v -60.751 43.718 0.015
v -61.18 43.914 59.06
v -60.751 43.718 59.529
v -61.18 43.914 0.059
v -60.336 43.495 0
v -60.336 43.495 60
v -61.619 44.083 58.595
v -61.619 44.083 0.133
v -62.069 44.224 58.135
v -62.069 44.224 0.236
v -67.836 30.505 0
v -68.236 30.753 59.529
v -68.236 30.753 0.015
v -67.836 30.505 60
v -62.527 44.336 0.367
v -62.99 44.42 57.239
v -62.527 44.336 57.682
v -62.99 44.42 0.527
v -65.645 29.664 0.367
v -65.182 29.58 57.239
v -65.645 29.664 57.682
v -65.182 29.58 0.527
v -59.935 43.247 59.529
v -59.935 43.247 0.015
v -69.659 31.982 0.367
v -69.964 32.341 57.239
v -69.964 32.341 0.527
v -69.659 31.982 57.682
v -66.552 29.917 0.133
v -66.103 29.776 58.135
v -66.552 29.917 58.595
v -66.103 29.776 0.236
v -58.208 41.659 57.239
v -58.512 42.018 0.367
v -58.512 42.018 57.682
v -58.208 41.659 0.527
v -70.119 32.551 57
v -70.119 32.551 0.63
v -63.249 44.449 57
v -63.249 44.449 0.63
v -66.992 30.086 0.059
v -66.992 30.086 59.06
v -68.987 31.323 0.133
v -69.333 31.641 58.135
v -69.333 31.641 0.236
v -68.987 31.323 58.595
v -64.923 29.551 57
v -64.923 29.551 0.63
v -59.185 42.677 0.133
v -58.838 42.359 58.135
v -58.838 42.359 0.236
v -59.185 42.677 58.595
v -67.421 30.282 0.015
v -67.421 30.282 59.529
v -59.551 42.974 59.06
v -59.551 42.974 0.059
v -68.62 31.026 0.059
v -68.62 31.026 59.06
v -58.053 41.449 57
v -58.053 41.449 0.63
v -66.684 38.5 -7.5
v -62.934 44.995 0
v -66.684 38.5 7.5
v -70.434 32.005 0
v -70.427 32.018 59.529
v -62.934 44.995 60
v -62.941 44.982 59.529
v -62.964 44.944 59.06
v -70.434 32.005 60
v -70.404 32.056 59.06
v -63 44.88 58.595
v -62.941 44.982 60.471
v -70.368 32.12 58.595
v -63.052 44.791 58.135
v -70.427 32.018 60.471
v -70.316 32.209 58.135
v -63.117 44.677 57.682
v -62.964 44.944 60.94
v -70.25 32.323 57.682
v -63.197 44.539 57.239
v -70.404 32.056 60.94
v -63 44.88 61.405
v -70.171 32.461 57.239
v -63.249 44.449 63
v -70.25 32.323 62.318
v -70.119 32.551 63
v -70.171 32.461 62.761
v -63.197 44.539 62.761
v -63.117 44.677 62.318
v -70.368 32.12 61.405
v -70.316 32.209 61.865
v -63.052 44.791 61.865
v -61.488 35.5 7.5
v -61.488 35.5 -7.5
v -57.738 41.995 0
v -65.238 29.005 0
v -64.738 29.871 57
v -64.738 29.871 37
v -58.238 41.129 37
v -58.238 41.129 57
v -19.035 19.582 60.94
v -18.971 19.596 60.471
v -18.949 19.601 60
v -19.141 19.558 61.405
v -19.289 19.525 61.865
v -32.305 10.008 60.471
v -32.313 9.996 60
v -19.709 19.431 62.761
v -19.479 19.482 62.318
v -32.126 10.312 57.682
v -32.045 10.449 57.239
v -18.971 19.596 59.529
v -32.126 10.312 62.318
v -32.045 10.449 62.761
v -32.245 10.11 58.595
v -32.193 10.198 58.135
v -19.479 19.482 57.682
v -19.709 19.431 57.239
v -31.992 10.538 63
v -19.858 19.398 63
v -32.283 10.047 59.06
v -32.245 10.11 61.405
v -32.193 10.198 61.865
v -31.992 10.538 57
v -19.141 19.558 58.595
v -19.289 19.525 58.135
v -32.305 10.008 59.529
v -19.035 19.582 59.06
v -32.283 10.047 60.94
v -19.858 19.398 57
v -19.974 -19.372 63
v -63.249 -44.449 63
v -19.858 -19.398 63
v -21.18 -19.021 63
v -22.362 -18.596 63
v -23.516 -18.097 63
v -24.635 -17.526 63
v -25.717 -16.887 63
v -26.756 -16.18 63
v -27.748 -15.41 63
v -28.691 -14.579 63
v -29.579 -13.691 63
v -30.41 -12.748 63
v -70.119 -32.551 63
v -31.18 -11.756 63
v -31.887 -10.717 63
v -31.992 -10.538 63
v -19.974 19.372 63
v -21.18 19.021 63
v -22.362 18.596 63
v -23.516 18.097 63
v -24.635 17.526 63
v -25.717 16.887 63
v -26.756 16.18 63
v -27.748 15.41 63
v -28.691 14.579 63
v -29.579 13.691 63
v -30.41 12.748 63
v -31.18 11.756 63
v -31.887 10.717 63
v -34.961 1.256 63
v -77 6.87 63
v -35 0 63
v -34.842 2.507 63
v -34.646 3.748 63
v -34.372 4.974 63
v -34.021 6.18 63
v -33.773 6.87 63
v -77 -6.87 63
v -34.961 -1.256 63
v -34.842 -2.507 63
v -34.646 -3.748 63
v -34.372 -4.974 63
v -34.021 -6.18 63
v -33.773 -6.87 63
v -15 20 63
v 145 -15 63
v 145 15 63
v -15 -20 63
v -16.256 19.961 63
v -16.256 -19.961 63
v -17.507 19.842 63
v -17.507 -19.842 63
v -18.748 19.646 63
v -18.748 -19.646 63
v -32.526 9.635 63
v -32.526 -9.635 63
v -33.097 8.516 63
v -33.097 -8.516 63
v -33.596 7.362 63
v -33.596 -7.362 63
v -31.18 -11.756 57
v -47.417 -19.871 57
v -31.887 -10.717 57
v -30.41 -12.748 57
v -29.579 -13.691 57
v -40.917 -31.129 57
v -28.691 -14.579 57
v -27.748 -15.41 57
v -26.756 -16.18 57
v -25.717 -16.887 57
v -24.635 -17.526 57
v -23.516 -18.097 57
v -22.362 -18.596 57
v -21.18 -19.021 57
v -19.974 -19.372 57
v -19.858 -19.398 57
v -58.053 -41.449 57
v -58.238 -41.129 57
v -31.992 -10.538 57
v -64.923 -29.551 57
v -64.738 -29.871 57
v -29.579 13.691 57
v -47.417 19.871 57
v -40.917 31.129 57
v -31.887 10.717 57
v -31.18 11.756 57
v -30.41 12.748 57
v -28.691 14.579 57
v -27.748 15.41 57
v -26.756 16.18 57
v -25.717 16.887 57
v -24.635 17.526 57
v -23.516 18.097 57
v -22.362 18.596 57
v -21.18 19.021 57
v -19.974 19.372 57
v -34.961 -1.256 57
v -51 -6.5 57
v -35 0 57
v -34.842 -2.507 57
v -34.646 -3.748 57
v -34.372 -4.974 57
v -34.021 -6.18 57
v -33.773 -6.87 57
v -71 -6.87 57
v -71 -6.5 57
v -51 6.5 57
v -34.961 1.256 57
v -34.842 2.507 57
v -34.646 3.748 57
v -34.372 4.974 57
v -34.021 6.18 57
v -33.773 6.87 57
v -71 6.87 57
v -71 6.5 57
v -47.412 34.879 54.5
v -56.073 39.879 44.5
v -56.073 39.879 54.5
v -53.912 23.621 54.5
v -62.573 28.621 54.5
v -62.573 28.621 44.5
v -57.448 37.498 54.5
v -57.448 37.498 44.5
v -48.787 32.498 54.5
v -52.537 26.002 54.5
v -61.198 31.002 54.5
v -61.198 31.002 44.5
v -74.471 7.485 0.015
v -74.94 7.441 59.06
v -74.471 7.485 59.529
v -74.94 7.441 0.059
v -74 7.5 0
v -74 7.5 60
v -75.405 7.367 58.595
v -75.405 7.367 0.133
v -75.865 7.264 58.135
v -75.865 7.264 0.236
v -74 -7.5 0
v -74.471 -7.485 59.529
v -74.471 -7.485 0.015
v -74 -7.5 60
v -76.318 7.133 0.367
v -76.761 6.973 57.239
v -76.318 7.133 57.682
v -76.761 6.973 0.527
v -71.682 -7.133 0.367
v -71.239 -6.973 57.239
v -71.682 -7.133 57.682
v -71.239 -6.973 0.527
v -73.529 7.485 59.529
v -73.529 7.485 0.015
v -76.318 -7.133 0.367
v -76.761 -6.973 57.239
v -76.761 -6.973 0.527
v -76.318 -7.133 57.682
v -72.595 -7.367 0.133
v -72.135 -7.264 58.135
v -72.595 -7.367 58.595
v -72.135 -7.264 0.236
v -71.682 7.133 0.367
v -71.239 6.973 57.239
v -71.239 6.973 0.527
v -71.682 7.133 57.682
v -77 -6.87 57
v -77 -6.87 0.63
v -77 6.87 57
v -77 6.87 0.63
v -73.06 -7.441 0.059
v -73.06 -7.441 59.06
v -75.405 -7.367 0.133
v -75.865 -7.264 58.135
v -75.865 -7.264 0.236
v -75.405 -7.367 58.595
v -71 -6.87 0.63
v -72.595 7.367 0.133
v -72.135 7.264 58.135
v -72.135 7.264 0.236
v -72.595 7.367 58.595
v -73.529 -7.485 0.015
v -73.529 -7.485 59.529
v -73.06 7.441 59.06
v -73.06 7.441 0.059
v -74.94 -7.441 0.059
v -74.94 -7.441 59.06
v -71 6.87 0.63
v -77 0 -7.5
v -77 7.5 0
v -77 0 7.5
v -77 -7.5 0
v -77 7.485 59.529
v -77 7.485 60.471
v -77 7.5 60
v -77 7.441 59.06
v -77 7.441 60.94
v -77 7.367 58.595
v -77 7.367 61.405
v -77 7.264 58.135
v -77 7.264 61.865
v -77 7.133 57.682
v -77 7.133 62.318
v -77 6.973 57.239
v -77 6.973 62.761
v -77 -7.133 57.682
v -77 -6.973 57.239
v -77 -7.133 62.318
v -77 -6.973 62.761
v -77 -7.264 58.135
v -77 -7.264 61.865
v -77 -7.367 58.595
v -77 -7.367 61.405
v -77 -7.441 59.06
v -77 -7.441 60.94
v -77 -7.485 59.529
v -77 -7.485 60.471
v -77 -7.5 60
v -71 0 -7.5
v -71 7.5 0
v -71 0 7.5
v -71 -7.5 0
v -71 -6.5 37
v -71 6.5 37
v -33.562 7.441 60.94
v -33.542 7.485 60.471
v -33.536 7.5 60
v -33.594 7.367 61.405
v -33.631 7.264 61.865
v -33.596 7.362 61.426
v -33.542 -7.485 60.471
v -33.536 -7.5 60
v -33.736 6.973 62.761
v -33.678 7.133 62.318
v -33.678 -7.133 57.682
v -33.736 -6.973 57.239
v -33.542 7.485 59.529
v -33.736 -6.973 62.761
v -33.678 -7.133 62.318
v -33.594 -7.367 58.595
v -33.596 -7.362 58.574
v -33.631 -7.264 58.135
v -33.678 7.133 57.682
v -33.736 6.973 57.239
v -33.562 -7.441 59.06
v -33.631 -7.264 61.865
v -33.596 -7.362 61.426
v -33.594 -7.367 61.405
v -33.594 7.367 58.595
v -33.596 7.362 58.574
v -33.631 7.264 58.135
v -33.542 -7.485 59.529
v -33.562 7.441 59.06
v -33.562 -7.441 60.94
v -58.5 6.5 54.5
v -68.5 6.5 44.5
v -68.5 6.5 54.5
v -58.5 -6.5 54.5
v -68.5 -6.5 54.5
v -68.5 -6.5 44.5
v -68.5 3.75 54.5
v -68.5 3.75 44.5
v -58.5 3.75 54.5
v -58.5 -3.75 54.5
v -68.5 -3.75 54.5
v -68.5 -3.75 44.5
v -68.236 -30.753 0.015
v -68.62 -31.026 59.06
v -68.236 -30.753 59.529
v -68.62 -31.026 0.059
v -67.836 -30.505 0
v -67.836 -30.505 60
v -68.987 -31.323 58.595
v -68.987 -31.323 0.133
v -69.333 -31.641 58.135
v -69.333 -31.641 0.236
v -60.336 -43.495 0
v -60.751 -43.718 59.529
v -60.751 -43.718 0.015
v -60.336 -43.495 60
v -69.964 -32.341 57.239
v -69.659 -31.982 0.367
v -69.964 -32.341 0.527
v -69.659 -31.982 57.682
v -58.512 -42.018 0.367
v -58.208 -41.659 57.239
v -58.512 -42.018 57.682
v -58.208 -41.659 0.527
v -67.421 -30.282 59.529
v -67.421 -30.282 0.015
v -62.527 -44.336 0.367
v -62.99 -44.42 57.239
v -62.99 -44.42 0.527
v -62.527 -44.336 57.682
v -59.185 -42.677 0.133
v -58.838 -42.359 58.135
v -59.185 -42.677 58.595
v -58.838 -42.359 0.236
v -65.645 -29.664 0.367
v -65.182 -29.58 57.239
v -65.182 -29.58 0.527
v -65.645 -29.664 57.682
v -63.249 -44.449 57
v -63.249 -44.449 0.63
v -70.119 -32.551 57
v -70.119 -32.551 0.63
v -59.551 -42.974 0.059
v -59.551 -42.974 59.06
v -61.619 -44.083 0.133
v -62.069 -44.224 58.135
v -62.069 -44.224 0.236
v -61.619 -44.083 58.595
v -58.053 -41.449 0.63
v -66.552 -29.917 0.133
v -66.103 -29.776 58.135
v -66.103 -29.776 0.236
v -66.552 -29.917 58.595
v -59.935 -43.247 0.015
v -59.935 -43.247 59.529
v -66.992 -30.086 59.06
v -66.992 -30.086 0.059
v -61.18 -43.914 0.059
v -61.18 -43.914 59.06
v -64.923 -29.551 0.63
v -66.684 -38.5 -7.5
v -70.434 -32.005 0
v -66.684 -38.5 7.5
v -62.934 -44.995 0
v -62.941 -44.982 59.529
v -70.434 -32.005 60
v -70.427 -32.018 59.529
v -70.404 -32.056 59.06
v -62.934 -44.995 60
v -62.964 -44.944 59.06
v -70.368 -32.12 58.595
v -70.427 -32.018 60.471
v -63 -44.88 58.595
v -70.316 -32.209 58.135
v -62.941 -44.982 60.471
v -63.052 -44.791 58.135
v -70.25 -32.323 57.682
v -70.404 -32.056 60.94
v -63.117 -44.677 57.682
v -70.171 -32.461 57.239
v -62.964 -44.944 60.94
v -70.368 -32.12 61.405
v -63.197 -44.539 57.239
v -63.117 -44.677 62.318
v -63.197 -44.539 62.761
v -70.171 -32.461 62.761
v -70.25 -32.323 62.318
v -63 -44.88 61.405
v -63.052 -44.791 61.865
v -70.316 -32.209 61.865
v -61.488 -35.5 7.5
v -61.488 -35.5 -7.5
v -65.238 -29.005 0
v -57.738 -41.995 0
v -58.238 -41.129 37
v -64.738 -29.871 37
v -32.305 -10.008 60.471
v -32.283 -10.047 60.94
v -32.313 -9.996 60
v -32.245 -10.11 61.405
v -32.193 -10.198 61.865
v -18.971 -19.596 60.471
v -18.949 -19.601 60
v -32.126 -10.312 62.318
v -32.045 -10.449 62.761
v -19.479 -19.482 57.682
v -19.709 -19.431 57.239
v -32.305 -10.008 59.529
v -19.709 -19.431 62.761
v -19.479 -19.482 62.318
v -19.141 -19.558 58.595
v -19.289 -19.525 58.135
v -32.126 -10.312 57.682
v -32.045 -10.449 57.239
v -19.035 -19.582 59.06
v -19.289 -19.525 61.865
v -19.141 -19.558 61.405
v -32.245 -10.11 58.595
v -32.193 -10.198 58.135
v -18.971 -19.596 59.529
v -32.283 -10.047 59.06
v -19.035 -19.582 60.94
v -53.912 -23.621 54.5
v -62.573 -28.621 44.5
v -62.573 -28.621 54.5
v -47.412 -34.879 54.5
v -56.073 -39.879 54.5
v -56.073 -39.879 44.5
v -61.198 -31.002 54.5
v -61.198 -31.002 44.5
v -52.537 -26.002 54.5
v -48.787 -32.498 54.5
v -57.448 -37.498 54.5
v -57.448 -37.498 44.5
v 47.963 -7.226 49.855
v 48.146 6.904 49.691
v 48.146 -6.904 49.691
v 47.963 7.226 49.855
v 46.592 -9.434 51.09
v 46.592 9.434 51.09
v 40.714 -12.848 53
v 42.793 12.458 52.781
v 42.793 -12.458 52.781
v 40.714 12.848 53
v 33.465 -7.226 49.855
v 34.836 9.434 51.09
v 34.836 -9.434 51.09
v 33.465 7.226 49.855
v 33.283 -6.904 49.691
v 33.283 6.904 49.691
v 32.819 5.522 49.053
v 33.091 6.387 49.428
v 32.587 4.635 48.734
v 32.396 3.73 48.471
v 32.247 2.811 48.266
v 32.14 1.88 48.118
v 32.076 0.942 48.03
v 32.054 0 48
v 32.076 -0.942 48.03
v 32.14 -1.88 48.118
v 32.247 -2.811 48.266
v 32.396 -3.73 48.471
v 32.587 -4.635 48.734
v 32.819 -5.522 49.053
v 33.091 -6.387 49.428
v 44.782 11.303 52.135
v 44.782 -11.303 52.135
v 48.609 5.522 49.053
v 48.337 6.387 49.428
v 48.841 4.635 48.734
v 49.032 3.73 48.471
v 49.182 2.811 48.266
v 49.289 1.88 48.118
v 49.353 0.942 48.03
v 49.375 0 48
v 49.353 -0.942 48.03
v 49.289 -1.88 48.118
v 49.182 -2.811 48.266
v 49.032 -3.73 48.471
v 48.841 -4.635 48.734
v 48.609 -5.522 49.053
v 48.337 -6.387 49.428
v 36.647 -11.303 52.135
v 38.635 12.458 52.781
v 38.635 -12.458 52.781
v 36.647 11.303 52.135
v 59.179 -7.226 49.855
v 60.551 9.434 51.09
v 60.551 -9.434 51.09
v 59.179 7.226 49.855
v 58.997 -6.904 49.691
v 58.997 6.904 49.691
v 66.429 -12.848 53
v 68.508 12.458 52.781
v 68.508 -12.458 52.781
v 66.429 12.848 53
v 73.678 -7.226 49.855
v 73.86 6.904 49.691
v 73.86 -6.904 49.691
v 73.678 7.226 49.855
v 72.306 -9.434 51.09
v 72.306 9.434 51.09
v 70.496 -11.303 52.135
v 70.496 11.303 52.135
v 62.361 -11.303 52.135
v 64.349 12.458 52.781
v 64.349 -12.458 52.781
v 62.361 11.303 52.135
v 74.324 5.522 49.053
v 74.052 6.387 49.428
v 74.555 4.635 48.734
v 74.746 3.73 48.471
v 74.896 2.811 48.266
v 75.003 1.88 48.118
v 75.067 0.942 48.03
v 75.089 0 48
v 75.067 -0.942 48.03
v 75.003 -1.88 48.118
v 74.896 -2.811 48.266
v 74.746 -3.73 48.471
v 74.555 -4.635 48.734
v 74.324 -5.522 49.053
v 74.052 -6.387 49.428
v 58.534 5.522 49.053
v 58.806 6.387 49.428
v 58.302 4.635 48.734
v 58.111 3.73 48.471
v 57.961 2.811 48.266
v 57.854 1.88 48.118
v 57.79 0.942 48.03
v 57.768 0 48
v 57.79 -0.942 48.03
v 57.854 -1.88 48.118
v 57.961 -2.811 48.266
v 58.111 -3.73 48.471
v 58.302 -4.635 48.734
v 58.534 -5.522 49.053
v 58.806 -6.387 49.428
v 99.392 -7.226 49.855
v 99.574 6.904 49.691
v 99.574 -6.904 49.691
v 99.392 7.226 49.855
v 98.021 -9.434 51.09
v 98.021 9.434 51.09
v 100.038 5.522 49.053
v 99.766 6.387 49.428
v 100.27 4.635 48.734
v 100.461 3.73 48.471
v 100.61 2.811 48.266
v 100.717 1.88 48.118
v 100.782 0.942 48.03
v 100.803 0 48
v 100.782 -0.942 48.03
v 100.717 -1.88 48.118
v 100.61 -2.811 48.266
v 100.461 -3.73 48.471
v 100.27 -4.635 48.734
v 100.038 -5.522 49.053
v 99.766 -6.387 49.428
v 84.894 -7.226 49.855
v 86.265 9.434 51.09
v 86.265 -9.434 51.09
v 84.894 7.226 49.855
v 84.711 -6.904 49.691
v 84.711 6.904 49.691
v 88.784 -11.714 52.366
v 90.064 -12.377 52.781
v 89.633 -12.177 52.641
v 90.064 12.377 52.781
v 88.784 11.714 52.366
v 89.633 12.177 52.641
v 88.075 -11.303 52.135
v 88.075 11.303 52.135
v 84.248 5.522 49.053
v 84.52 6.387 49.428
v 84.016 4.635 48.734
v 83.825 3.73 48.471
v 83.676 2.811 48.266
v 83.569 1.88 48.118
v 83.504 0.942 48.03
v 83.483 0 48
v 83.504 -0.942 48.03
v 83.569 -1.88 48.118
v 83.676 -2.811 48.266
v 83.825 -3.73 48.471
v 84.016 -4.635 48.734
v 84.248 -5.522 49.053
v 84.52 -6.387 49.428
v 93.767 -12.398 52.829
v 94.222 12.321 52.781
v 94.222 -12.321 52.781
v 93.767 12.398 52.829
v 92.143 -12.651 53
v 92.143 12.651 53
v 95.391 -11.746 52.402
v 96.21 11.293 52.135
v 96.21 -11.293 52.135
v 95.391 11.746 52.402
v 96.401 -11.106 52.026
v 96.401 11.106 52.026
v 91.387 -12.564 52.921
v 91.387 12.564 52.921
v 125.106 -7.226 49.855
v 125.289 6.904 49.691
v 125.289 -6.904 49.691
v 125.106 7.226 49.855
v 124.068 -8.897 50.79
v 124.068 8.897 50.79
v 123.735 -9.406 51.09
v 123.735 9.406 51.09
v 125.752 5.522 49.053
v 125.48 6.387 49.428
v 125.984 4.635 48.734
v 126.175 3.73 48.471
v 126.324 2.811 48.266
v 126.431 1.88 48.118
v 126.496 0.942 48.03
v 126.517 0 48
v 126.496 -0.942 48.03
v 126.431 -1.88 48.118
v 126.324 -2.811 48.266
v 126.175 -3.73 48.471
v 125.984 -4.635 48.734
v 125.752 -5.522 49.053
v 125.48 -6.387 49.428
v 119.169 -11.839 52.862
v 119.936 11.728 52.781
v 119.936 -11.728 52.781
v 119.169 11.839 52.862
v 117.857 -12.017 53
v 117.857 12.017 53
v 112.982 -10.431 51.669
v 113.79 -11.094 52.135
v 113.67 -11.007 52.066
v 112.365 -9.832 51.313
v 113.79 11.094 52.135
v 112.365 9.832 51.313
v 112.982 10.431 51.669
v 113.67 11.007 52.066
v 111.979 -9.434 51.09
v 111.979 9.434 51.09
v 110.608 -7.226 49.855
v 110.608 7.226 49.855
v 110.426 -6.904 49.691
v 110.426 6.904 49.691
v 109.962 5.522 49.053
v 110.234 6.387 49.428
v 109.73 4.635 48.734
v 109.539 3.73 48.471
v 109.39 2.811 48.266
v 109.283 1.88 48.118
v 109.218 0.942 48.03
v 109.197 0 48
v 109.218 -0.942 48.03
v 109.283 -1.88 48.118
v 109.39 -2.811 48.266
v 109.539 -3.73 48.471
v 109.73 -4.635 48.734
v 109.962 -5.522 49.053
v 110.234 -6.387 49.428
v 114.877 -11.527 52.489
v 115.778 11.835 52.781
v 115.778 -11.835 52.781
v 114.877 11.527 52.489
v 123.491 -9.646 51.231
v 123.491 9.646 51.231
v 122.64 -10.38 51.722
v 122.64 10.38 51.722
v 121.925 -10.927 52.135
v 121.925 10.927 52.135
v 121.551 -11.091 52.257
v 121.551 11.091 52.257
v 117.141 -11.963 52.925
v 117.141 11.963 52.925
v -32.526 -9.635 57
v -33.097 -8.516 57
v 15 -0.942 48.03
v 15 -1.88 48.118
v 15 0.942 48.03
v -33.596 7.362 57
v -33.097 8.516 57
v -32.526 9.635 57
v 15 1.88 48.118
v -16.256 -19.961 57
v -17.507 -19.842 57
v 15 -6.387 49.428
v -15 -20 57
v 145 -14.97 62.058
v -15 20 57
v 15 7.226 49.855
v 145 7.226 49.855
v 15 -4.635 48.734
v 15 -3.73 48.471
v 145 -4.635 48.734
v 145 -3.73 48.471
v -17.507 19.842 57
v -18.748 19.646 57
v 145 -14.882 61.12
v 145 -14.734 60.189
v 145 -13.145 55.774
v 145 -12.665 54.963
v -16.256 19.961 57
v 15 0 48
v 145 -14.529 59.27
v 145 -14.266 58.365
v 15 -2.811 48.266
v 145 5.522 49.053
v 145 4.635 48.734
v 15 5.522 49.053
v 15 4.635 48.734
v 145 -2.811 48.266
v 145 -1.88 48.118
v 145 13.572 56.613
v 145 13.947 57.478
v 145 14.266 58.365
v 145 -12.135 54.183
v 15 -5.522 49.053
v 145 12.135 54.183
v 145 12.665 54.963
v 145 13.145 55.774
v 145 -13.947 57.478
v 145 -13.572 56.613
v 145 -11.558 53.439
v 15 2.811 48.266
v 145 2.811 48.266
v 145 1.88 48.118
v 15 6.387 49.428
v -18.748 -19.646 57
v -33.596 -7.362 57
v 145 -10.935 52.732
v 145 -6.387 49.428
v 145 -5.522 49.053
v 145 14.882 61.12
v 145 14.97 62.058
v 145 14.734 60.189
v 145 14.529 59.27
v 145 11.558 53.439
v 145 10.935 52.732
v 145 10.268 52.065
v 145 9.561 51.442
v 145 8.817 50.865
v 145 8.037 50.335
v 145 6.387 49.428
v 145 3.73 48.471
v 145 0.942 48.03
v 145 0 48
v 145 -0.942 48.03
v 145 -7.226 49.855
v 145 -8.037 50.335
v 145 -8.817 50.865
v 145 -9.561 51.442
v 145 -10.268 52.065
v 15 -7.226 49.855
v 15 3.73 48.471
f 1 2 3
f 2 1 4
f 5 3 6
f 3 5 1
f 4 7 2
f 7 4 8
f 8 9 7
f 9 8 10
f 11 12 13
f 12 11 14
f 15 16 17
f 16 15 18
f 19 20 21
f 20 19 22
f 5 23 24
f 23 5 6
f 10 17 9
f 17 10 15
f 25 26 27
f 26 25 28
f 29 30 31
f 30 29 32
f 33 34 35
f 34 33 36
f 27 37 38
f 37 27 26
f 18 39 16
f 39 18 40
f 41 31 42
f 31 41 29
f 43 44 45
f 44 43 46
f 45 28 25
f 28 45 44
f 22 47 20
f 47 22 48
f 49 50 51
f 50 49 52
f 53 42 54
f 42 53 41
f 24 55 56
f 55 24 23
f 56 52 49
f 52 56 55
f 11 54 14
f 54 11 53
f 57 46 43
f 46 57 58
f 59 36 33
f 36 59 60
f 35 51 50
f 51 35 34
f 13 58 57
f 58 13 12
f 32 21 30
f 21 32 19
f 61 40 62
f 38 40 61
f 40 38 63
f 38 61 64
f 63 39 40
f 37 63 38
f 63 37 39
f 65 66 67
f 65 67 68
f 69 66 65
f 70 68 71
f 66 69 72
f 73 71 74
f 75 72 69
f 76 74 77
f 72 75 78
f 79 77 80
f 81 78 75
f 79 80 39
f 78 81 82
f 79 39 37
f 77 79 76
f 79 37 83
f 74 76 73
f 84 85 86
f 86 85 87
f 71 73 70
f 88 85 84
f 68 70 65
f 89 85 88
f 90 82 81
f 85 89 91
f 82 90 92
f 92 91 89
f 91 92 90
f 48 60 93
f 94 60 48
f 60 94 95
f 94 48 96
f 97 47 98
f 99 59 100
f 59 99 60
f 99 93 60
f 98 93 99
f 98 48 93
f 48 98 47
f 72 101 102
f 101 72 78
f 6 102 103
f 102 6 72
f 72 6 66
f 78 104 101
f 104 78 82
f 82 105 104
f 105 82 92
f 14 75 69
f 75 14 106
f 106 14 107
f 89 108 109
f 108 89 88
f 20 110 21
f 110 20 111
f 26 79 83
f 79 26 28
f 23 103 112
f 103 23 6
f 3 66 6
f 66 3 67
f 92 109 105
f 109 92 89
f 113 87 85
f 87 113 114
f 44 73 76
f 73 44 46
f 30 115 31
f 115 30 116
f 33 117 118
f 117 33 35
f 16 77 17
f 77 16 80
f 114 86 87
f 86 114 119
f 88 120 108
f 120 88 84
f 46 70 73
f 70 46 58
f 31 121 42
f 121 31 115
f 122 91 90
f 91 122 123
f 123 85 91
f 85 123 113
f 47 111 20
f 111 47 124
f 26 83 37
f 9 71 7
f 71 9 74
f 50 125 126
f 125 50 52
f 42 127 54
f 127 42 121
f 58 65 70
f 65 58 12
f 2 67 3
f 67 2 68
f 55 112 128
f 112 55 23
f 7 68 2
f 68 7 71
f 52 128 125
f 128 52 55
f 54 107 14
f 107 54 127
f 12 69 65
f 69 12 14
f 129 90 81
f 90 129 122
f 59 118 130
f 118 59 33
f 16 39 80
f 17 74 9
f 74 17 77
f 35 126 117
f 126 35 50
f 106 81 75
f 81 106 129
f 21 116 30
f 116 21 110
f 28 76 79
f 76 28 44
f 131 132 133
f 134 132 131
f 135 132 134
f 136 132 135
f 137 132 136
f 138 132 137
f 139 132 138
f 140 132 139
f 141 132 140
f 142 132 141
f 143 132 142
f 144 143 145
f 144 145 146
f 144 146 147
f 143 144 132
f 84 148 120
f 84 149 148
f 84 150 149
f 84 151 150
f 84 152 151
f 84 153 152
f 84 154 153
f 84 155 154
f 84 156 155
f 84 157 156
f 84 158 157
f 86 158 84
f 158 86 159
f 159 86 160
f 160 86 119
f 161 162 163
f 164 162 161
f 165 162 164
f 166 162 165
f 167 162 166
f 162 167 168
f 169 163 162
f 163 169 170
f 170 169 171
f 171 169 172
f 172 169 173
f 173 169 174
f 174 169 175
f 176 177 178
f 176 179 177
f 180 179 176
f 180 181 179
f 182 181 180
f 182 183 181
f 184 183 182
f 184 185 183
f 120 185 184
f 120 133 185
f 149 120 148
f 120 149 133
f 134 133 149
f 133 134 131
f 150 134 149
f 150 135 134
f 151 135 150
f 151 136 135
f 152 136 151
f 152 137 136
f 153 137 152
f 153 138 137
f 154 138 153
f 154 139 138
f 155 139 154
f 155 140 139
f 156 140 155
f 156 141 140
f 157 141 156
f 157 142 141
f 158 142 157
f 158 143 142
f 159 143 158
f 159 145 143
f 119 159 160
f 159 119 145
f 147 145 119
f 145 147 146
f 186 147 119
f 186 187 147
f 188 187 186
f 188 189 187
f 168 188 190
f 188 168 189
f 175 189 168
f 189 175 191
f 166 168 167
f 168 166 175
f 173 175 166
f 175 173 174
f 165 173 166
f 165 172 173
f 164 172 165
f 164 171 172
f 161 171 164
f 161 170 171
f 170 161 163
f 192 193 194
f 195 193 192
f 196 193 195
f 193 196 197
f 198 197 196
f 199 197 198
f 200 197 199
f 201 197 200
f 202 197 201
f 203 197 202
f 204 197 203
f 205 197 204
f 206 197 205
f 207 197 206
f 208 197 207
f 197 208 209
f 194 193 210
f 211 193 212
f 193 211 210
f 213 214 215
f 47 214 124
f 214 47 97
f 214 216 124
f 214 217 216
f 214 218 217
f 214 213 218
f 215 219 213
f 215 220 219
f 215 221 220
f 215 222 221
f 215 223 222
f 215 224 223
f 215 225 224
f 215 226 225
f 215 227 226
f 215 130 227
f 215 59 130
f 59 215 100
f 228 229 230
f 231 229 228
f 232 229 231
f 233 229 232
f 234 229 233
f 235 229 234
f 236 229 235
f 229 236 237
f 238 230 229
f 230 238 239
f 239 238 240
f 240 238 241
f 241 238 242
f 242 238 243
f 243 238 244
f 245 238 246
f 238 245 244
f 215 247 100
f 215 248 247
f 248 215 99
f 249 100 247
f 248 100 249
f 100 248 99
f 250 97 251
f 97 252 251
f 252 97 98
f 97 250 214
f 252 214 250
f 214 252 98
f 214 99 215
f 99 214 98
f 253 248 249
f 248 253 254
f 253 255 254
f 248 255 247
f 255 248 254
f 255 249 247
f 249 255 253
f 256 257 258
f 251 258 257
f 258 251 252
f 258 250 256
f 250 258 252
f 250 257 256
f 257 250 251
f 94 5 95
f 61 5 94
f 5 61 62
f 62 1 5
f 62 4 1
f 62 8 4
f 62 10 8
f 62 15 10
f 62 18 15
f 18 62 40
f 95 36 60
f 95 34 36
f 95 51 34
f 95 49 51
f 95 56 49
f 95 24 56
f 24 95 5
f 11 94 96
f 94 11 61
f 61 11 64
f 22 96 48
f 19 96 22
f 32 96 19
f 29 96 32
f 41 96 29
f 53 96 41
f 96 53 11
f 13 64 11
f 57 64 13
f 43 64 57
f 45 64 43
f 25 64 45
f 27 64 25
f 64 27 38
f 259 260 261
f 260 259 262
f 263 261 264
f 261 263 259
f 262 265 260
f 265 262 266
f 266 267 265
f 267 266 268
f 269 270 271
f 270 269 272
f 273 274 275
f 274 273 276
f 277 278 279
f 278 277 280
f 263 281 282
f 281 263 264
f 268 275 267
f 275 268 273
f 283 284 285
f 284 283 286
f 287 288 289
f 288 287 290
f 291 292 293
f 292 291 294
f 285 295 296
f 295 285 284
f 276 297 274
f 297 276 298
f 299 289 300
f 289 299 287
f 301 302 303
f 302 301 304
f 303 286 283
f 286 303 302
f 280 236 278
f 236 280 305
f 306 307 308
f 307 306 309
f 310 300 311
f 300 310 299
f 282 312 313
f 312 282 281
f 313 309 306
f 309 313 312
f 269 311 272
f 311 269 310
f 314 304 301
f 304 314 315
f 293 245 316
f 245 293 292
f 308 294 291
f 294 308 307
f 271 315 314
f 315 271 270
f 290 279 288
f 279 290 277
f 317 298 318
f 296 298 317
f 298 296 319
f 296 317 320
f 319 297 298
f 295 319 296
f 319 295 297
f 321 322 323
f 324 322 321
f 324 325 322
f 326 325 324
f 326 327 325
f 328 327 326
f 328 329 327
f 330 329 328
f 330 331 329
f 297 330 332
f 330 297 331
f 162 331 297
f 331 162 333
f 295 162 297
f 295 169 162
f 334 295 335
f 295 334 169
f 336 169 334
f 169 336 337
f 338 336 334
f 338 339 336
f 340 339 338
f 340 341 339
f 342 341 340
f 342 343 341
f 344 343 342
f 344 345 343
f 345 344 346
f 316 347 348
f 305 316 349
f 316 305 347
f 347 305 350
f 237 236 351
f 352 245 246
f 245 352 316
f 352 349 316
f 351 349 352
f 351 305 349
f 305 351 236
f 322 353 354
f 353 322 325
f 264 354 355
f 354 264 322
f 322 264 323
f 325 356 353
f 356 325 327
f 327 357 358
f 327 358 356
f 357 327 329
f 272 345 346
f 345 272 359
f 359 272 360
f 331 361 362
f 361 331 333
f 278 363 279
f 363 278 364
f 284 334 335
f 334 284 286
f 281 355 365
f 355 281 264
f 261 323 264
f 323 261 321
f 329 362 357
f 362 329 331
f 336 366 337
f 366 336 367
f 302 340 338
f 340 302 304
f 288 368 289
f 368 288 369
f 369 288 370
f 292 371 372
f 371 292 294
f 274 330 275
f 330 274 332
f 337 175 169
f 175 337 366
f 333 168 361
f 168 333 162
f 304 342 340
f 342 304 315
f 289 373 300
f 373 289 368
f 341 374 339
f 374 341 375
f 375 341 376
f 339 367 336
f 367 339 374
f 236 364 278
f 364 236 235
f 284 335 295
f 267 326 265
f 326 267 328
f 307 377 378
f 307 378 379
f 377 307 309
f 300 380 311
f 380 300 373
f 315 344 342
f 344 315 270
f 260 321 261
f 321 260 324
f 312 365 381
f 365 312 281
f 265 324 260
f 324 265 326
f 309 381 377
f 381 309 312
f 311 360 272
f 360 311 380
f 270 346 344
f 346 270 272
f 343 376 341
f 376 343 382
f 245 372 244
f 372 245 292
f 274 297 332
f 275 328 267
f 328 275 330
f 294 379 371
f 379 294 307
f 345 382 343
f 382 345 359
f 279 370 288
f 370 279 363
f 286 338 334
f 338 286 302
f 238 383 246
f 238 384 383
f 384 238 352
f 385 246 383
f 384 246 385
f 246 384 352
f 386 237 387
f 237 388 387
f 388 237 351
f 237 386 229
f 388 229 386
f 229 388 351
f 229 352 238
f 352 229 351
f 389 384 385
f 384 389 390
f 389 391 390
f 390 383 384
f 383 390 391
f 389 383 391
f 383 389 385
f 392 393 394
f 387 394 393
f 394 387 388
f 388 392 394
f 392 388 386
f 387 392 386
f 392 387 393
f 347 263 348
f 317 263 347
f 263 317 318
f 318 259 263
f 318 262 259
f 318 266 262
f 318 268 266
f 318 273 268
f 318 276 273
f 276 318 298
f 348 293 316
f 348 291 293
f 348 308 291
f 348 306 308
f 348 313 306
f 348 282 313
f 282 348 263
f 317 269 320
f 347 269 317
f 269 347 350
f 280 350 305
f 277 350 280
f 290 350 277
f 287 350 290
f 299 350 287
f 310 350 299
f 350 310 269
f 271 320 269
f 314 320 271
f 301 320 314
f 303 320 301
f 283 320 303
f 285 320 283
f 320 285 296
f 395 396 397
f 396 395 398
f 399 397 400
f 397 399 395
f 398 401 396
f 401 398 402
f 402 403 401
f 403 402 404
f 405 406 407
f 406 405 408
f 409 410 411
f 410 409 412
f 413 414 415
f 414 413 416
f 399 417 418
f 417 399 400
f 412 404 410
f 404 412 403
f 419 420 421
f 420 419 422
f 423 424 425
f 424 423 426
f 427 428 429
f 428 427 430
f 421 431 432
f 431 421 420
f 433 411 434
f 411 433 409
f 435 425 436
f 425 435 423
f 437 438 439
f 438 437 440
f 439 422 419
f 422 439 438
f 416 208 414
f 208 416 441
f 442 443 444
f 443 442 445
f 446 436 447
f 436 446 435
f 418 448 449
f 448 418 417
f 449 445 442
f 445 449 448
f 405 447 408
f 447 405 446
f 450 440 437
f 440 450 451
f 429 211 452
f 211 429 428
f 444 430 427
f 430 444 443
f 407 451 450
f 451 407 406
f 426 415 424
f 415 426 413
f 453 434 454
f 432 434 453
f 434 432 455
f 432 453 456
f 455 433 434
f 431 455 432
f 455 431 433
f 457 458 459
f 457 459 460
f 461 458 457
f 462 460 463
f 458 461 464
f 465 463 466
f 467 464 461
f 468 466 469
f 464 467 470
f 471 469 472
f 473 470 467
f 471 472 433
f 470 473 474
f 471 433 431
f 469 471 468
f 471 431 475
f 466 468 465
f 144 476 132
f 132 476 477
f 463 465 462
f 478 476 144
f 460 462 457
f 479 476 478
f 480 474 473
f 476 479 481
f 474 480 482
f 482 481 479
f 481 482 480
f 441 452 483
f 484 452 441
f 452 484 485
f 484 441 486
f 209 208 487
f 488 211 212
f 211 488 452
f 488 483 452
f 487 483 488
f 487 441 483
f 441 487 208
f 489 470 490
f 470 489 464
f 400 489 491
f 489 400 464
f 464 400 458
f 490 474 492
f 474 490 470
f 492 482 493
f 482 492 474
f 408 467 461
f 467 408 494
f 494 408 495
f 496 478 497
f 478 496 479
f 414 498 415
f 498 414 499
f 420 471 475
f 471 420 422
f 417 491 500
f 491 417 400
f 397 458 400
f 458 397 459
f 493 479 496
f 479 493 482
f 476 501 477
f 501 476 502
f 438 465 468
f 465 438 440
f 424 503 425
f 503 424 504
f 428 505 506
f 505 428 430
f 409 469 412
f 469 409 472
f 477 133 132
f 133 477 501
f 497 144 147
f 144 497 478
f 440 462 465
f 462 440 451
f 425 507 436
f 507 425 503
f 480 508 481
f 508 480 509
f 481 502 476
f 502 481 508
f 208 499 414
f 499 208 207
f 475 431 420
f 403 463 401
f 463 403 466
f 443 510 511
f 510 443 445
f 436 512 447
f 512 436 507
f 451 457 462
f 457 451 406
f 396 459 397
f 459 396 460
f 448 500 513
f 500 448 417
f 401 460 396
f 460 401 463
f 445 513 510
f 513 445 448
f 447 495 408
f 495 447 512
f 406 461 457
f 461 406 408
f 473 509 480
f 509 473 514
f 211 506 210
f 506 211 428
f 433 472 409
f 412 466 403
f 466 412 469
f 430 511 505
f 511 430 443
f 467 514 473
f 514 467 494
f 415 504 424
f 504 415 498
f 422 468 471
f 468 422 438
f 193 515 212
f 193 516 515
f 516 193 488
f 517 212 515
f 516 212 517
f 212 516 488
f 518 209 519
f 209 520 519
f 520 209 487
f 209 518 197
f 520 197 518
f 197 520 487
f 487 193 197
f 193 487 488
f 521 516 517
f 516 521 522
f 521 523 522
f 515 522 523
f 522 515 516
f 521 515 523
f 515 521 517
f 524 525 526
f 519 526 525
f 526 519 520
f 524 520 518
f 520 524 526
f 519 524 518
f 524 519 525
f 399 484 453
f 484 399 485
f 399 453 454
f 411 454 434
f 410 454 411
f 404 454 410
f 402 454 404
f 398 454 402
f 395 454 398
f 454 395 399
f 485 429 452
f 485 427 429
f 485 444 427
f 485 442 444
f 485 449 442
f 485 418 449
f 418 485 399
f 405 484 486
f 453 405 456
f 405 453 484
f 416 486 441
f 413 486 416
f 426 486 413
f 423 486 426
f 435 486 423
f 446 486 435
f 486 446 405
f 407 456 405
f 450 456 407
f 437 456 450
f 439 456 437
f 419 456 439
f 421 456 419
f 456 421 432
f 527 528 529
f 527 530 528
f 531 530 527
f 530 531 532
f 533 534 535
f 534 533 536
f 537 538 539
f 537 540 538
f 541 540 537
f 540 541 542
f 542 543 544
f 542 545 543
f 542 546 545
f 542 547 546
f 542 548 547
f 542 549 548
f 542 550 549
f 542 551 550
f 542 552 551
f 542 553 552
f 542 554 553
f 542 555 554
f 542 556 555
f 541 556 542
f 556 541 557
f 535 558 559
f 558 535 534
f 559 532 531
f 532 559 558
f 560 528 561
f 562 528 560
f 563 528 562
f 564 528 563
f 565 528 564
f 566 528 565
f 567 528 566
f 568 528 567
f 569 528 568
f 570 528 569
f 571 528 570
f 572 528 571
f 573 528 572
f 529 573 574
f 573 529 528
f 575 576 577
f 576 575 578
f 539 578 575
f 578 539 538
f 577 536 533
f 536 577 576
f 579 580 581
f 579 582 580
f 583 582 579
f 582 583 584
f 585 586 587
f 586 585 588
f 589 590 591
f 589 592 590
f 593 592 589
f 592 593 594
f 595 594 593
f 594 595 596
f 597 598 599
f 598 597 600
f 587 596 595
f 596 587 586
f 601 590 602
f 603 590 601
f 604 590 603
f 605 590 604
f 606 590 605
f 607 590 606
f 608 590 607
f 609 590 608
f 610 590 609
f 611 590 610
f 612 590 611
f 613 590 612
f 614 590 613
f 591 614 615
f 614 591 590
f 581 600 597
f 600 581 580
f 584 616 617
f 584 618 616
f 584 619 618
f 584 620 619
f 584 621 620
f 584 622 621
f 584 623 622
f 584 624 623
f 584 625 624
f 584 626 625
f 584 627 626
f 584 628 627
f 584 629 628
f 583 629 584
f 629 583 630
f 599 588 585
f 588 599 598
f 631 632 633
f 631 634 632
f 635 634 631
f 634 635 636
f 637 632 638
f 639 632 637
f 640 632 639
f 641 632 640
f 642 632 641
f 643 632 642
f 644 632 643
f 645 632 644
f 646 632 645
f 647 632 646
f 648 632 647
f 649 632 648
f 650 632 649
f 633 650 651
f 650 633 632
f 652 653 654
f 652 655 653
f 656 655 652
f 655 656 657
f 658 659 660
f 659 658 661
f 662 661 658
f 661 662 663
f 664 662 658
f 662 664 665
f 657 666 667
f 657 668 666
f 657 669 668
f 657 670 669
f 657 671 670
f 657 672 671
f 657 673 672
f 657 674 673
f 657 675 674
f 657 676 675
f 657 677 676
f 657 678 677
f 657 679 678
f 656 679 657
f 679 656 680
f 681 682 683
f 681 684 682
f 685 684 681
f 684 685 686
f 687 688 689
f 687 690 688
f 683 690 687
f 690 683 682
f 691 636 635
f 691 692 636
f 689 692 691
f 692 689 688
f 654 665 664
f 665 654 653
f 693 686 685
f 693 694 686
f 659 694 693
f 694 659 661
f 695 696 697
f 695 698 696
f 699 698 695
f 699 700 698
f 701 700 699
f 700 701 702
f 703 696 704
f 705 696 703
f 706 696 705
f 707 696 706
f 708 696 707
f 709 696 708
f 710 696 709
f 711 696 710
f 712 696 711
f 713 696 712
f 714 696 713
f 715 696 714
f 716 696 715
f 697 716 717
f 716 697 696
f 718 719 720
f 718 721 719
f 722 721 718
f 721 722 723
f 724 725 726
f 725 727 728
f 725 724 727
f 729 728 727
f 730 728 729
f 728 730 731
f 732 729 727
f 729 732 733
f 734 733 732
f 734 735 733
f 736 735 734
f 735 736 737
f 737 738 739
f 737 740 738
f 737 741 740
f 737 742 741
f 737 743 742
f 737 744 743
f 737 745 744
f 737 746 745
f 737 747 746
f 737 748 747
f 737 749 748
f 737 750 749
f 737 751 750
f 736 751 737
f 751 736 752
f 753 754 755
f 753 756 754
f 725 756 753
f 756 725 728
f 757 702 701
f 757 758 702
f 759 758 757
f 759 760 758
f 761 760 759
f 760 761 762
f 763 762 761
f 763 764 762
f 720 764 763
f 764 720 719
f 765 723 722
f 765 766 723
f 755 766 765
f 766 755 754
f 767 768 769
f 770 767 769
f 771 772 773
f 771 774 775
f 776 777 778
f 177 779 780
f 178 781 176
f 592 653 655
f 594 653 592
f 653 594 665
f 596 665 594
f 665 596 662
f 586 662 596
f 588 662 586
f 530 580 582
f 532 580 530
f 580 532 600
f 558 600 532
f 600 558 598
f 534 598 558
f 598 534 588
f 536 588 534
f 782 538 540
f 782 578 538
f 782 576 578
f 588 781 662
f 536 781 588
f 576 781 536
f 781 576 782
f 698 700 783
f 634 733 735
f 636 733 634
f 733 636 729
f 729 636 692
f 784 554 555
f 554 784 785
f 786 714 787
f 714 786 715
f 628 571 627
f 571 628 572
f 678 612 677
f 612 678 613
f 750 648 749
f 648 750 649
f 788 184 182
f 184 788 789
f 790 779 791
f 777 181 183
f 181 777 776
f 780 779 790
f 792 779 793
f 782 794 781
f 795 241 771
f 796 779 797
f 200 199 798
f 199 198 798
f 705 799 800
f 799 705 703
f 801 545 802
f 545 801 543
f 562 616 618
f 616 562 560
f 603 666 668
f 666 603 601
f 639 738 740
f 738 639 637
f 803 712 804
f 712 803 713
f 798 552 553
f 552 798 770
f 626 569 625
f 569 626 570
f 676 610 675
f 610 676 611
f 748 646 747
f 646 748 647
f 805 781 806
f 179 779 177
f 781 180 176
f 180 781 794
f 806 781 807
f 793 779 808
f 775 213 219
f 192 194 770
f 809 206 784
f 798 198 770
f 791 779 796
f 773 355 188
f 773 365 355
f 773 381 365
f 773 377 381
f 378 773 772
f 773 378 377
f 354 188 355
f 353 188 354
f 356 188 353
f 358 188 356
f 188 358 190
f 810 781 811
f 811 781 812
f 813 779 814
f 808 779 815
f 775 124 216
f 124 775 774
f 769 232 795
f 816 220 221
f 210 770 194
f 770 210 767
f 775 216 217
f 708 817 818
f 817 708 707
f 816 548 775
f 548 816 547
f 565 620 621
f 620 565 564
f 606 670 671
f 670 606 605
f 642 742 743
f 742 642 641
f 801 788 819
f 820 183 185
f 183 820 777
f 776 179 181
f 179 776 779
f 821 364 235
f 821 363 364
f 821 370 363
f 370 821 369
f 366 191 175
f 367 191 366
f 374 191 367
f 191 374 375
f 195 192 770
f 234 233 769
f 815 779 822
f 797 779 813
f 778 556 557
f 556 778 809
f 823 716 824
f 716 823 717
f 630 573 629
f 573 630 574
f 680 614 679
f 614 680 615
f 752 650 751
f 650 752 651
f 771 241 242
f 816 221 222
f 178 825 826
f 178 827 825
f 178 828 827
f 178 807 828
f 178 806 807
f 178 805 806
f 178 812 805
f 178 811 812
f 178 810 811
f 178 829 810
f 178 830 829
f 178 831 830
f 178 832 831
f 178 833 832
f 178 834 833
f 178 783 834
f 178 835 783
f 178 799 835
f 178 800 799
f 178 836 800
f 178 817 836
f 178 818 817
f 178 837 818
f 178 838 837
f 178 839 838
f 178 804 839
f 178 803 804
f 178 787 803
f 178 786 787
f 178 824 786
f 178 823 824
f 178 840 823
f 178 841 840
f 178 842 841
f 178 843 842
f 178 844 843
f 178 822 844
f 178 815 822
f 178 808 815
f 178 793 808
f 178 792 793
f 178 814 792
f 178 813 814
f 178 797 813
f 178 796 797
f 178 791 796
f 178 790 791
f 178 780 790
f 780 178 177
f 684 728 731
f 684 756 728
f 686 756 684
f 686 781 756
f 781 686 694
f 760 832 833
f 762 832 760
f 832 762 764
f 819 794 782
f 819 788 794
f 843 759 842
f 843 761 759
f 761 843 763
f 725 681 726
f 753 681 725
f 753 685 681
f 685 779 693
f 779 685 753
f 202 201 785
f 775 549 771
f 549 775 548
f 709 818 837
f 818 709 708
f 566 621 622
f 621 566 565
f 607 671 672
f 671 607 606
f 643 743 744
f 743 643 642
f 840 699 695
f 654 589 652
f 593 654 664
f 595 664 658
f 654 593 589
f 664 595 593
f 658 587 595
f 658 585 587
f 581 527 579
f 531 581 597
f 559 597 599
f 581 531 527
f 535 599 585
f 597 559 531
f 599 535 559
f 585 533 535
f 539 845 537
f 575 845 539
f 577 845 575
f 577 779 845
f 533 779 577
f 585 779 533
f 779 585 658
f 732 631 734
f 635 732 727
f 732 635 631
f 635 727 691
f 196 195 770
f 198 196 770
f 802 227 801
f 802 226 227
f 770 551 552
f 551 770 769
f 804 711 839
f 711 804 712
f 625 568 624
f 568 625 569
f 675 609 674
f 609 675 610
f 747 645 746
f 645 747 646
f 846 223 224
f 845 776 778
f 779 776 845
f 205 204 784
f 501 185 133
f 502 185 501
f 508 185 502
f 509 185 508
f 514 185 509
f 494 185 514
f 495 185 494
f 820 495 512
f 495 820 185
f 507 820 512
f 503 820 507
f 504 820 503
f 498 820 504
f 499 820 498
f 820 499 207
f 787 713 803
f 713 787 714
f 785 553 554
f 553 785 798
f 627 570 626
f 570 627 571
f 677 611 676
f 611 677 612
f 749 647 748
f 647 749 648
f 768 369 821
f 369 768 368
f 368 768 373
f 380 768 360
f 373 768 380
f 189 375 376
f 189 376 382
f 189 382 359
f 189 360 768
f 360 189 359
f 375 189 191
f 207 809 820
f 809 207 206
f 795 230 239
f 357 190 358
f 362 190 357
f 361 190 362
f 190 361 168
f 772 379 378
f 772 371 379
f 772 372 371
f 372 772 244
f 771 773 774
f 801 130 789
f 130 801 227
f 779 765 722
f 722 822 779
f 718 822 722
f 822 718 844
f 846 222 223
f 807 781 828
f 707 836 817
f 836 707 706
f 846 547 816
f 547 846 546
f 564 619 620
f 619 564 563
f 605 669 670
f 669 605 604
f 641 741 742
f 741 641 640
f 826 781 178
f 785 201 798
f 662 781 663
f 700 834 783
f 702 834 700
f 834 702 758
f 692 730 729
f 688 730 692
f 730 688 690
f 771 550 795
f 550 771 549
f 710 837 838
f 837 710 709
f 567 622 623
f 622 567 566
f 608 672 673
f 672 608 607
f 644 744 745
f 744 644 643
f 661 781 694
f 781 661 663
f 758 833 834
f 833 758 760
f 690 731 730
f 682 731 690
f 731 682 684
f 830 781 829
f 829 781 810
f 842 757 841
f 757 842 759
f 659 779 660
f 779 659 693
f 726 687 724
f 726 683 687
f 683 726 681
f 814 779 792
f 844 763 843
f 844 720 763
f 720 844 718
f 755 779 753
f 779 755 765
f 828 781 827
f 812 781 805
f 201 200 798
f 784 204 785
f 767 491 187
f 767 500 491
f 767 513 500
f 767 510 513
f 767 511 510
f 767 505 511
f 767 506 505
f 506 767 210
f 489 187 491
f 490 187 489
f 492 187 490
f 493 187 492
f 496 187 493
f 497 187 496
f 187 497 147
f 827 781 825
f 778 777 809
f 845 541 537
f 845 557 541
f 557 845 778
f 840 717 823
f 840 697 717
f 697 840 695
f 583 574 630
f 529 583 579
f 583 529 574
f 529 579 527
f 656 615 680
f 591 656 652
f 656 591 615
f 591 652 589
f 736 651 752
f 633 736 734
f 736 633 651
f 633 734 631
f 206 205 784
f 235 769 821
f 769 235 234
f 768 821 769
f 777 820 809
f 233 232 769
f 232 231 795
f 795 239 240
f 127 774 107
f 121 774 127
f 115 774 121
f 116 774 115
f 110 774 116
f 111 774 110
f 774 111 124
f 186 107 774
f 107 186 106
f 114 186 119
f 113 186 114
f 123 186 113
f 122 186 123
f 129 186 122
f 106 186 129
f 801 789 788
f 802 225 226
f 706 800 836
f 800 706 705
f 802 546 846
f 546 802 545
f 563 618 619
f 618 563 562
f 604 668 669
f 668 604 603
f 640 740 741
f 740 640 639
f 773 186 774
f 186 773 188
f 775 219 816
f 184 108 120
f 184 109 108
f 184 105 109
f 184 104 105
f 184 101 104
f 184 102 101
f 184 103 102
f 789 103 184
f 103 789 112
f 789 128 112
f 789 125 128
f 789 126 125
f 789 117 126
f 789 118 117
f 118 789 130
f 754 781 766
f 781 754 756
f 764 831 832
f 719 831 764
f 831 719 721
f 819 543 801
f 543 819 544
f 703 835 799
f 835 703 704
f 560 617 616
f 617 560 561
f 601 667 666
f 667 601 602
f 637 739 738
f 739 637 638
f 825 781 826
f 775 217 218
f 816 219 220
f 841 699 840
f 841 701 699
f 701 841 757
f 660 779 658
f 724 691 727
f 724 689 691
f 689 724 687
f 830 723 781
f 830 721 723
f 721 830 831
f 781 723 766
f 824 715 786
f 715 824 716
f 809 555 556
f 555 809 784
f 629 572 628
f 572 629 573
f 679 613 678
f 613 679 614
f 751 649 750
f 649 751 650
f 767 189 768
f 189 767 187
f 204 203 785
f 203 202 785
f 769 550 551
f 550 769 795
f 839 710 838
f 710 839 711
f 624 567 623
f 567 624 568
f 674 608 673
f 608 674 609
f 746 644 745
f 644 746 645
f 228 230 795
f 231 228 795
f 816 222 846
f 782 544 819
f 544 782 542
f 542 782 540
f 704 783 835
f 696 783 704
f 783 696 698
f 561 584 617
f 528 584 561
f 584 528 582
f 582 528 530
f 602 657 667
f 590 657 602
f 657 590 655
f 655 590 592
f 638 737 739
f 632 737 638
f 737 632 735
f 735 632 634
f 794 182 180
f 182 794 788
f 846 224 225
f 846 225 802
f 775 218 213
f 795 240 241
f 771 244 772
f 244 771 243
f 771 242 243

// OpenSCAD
//Created By Matthew Andres
//OSAT Project


prong_height = 60; //how tall prong is
prong_width = 15; //how wide the prong is 
prong_depth = 6; //how thick the prong is
prong_length = 75; //length from handle 
support_distance = 20; //how big the triangle on the corner is

hub_radius = 20; //radius of hub that connects all prongs
total_length =50; //total length of hub
end_width = 30; //end width of hub
hub_height = 6; // how tall hub is

//not working for other values need to change code below to organize how you want if change value
num_prongs = 3; //total number of prongs

//handle variables -- these do not all work properly when changing values
grip_radius = 15; //radius of handle
finger_depth = 10; //how deep fingers go
grip_length = 130; //length of handle
finger_radius= 10; //how wide fingers are
num_fingers = 4; //how many finger grips


//need to change if change number of prongs
for (i = [1:num_prongs]){
    rotate(i*(180/num_prongs)/2+(180/num_prongs)/2)
    prong();   
};
translate([-15,0,prong_height-(hub_height)/2])
rotate([0,0,0])
//hub();
//rotate([0,180,90])

handle();

module hub(){
difference(){
linear_extrude(height=hub_height){
circle(r=hub_radius,$fn=100);
}
translate([0,hub_radius/2,hub_height/2])
cube([2*hub_radius,hub_radius,2*hub_height],center=true);
}


linear_extrude(height=hub_height)
polygon([[-hub_radius,0],[hub_radius,0],[end_width/2,total_length-hub_radius],[-end_width/2,total_length-hub_radius]],[[0,1,2,3]]);

}
module prong(){
translate([0,prong_length-1,0])
union(){
difference(){
    cylinder(h=prong_height, d = prong_width,$fn =100);
    translate([-prong_width/2,prong_depth/2,-1])
    cube([prong_width,prong_width,prong_height+2]);
    translate([-prong_width/2,-prong_width-prong_depth/2,-1])
    cube([prong_width,prong_width,prong_height+2]);
}

rotate([0,45,0])
cube([prong_width/sqrt(2),prong_depth,prong_width/sqrt(2)], center=true);


translate([0,prong_depth/2,prong_height])
rotate([90,0,0])
difference(){
    cylinder(h=prong_length, d = prong_width,$fn =100);
    translate([-prong_width/2,prong_depth/2,-1])
    cube([prong_width,prong_width,prong_length+2]);
    translate([-prong_width/2,-prong_width-prong_depth/2,-1])
    cube([prong_width,prong_width,prong_length+2]);
}

mod = support_distance/8;
translate([+prong_width/2-1,-prong_depth/2,prong_height-prong_depth/2])
rotate([0,90,180])
difference(){
linear_extrude(height=prong_width-2)
polygon([[0,0],[0,support_distance],[support_distance,0]],[[0,1,2]]);

translate([mod,mod,-1])    
linear_extrude(height=prong_width/4)
polygon([[0,0],[0,support_distance/2],[support_distance/2,0]],[[0,1,2]]);
    
translate([mod,mod,prong_width*3/4-1])    
linear_extrude(height=prong_width/4)
polygon([[0,0],[0,support_distance/2],[support_distance/2,0]],[[0,1,2]]);
}}
}

module handle(){
difference(){
rotate([0,180,0])
hull(){
rotate([0,180,0])
union(){
translate([total_length-hub_radius,0,hub_height])
rotate([90,180,90])
difference(){
cylinder(h=grip_length, r=grip_radius, $fn=100);
translate([-grip_radius*3/2,-grip_radius*2,-grip_length/2])
cube([3*grip_radius,2*grip_radius,2*grip_length],center=false);
}

rotate([0,0,-90])
hub();
}
}

for (i = [1:num_fingers]){
    
    translate([i*(grip_length-num_fingers*finger_radius)/(num_fingers-.5)+total_length-hub_radius,finger_radius*2,-grip_radius+1])
    rotate([90,90,0])
    cylinder(r=finger_radius, h = 4*grip_radius);   
};
}

}
